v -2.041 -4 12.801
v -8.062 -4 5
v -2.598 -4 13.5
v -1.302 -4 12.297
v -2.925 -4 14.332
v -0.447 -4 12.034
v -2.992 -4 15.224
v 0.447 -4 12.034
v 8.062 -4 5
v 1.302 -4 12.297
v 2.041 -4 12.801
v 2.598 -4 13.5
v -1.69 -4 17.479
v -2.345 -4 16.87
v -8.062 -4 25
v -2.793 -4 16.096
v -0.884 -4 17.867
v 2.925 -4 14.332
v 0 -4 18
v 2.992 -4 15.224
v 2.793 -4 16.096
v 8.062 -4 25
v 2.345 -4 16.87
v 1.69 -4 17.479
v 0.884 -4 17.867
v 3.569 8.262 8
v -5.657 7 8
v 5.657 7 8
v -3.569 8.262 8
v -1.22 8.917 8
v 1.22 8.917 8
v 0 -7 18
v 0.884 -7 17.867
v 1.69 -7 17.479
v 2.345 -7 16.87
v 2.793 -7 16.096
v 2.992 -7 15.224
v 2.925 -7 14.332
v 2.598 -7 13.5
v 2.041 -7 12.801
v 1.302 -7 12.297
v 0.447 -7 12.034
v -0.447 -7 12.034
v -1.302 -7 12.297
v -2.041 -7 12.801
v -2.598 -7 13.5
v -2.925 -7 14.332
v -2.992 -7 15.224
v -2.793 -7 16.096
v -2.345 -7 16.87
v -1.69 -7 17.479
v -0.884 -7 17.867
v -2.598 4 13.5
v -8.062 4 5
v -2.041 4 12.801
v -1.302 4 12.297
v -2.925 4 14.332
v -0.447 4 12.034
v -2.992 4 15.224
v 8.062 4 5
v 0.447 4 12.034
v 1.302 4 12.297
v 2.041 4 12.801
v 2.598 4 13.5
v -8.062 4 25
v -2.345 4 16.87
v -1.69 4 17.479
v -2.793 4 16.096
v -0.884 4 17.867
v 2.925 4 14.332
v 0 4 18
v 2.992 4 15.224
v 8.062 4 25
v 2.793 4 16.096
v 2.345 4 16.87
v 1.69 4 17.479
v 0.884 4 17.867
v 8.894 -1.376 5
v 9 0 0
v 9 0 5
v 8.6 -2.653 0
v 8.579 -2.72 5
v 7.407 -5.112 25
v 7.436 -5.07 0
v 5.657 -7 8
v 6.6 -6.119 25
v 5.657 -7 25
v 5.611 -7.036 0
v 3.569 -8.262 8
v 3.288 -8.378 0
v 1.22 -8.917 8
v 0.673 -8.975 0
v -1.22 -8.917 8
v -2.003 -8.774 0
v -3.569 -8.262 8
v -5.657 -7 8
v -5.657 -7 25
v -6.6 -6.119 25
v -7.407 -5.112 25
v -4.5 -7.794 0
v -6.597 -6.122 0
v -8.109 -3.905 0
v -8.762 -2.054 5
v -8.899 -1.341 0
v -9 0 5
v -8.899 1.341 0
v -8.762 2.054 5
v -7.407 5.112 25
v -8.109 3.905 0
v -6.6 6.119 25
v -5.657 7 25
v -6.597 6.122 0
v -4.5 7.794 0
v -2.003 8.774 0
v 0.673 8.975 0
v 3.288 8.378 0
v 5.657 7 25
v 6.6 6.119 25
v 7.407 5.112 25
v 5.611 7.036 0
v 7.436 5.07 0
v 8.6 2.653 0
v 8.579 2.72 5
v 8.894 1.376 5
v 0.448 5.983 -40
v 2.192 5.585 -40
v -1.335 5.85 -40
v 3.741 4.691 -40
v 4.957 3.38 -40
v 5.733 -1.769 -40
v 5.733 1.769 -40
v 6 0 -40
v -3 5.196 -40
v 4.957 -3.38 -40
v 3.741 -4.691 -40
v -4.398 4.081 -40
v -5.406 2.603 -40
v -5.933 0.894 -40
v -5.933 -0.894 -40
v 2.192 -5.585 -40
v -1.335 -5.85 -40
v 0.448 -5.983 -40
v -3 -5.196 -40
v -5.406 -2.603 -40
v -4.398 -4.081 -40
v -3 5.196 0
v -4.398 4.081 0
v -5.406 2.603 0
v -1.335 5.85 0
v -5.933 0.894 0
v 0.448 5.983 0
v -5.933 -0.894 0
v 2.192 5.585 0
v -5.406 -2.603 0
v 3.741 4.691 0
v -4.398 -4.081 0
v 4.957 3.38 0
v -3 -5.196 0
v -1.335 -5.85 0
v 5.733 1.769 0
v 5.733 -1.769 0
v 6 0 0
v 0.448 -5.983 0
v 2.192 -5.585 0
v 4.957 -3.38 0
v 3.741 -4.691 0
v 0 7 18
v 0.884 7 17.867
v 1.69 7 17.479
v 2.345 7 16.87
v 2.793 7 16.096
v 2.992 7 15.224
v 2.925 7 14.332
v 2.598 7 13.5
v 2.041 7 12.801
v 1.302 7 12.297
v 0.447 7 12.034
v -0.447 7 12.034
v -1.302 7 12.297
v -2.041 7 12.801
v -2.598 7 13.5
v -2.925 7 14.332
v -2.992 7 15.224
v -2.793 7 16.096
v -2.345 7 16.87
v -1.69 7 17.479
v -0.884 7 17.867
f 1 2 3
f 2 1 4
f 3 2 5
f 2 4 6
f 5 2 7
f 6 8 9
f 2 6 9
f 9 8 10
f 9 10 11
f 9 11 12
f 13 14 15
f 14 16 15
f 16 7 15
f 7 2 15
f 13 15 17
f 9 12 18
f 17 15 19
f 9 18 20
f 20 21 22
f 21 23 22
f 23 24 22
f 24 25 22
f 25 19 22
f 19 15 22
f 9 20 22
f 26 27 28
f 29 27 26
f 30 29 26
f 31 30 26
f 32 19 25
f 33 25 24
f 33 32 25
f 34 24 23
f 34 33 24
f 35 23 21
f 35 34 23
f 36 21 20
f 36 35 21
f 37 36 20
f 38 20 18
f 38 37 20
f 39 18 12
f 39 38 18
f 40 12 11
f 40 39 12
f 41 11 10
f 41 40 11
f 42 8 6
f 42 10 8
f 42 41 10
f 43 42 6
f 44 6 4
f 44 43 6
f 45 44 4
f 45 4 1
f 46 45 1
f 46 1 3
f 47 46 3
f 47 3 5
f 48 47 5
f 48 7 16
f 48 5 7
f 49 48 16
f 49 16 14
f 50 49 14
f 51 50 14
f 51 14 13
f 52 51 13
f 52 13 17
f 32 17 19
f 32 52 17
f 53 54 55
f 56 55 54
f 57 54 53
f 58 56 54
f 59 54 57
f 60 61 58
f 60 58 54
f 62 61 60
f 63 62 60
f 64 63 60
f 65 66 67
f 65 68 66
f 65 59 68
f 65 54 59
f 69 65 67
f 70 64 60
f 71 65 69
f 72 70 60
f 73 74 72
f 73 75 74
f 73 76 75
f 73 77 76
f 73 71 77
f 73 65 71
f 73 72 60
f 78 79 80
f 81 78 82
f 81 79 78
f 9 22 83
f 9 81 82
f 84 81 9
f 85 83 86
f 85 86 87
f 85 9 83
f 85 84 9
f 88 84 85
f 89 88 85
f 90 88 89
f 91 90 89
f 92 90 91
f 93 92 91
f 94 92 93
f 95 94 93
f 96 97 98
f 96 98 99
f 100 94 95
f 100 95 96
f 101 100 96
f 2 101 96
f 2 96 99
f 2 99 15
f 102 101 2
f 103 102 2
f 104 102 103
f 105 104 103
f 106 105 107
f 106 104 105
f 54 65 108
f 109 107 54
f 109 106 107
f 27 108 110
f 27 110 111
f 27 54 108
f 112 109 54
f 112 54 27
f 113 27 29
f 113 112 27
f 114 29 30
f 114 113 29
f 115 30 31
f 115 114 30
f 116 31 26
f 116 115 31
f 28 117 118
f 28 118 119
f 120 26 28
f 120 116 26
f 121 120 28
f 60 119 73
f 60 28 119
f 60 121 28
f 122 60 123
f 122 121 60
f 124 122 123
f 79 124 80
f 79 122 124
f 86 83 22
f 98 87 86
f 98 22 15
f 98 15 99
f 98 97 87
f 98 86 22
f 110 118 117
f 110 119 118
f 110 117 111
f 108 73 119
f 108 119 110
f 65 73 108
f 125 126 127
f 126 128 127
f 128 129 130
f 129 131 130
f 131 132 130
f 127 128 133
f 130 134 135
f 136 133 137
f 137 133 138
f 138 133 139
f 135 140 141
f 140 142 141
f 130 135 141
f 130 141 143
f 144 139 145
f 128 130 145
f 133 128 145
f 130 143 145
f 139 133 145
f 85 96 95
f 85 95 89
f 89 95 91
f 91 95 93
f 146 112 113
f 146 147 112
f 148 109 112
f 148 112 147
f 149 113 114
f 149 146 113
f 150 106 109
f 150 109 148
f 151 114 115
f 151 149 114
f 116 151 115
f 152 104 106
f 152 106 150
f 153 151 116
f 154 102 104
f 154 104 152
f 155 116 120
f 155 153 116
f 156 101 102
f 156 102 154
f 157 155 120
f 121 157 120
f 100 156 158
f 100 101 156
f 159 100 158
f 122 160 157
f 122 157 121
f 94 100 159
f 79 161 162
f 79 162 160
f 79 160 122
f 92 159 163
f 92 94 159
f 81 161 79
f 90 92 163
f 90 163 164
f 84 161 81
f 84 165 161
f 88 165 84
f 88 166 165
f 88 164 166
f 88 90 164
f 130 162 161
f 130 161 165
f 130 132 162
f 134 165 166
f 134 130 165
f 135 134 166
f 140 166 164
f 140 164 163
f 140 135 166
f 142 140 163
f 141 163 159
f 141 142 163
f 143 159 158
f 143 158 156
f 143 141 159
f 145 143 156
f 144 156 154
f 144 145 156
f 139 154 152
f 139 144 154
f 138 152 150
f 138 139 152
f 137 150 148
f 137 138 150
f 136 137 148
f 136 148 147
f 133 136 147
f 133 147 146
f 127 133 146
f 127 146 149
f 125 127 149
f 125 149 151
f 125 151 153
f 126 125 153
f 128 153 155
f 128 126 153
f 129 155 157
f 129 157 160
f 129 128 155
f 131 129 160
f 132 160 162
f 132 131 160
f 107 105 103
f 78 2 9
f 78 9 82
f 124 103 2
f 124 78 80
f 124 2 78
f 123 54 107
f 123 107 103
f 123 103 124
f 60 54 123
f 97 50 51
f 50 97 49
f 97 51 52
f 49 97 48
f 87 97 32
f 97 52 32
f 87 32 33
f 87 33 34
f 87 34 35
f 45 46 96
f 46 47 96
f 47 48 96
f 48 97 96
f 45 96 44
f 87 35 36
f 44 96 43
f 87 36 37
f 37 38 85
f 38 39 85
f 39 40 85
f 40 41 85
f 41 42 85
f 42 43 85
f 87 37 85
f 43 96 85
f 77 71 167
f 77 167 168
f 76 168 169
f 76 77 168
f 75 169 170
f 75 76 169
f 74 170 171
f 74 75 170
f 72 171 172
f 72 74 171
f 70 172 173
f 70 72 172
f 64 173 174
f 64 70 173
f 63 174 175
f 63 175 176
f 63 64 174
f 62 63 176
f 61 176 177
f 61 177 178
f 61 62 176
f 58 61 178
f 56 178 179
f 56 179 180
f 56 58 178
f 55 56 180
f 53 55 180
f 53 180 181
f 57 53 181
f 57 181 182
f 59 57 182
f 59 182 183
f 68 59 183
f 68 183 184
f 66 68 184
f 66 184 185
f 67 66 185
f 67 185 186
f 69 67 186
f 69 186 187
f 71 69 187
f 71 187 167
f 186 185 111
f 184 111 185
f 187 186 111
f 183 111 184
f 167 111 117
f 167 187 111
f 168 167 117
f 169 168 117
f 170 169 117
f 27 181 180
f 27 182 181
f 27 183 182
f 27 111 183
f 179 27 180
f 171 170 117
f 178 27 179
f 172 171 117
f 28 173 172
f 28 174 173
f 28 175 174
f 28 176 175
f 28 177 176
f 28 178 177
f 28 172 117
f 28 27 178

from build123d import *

# Parameters (mm, degrees)
SZKIC2_W                        = 18
SZKIC2_H                        = 8
WYTNIJ_WYCI_GNI_CIE1_DEPTH      = 20
WYTNIJ_WYCI_GNI_CIE2_DEPTH      = 42.976183724
WYTNIJ_WYCI_GNI_CIE2_DEPTH_BACK = 42.976183724
SZKIC3_R                        = 3
WYTNIJ_WYCI_GNI_CIE3_START      = 7
SZKIC3_4_W                      = 16.124515496
SZKIC3_4_H                      = 17
SZKIC3_4_R                      = 3
WYTNIJ_WYCI_GNI_CIE3_DEPTH      = 35.976183767


with BuildPart() as part:
    # Szkic1 → Obrót1 (revolve)
    with BuildSketch(Plane(origin=(0, 0, 0), x_dir=(1, 0, 0), z_dir=(0, 1, 0))):
        Polygon((0, -25), (9, -25), (9, 0), (6, 0), (6, 40), (0, 40), align=None)
    revolve(axis=Axis((0, 0, 44.409951059), (0, 0, -1)))

    # Szkic2 → Wytnij-wyciągnięcie1 (cut)
    with BuildSketch(Plane.XY.offset(25)):
        Rectangle(SZKIC2_W, SZKIC2_H)
    extrude(amount=-WYTNIJ_WYCI_GNI_CIE1_DEPTH, mode=Mode.SUBTRACT)

    # Szkic3 → Wytnij-wyciągnięcie2 (cut, two sides: drawn at the far end of the back side and taken through both)
    with BuildSketch(Plane(origin=(0, 0, 0), x_dir=(1, 0, 0), z_dir=(0, 1, 0)).offset(-WYTNIJ_WYCI_GNI_CIE2_DEPTH_BACK)):
        with Locations((0, -15)):
            Circle(SZKIC3_R)
    extrude(amount=WYTNIJ_WYCI_GNI_CIE2_DEPTH + WYTNIJ_WYCI_GNI_CIE2_DEPTH_BACK, mode=Mode.SUBTRACT)

    # Szkic3<4> → Wytnij-wyciągnięcie3 (cut, through all)
    with BuildSketch(Plane(origin=(0, 0, 0), x_dir=(1, 0, 0), z_dir=(0, 1, 0)).offset(WYTNIJ_WYCI_GNI_CIE3_START)):
        with Locations((0, -16.5)):
            Rectangle(SZKIC3_4_W, SZKIC3_4_H)
        with Locations((0, -15)):
            Circle(SZKIC3_4_R, mode=Mode.SUBTRACT)
    wytnij_wyci_gni_cie3 = extrude(amount=WYTNIJ_WYCI_GNI_CIE3_DEPTH, mode=Mode.SUBTRACT)

    # Lustro1: Wytnij-wyciągnięcie3 across plane
    add(wytnij_wyci_gni_cie3.mirror(Plane.ZX), mode=Mode.SUBTRACT)


solid = part.part
